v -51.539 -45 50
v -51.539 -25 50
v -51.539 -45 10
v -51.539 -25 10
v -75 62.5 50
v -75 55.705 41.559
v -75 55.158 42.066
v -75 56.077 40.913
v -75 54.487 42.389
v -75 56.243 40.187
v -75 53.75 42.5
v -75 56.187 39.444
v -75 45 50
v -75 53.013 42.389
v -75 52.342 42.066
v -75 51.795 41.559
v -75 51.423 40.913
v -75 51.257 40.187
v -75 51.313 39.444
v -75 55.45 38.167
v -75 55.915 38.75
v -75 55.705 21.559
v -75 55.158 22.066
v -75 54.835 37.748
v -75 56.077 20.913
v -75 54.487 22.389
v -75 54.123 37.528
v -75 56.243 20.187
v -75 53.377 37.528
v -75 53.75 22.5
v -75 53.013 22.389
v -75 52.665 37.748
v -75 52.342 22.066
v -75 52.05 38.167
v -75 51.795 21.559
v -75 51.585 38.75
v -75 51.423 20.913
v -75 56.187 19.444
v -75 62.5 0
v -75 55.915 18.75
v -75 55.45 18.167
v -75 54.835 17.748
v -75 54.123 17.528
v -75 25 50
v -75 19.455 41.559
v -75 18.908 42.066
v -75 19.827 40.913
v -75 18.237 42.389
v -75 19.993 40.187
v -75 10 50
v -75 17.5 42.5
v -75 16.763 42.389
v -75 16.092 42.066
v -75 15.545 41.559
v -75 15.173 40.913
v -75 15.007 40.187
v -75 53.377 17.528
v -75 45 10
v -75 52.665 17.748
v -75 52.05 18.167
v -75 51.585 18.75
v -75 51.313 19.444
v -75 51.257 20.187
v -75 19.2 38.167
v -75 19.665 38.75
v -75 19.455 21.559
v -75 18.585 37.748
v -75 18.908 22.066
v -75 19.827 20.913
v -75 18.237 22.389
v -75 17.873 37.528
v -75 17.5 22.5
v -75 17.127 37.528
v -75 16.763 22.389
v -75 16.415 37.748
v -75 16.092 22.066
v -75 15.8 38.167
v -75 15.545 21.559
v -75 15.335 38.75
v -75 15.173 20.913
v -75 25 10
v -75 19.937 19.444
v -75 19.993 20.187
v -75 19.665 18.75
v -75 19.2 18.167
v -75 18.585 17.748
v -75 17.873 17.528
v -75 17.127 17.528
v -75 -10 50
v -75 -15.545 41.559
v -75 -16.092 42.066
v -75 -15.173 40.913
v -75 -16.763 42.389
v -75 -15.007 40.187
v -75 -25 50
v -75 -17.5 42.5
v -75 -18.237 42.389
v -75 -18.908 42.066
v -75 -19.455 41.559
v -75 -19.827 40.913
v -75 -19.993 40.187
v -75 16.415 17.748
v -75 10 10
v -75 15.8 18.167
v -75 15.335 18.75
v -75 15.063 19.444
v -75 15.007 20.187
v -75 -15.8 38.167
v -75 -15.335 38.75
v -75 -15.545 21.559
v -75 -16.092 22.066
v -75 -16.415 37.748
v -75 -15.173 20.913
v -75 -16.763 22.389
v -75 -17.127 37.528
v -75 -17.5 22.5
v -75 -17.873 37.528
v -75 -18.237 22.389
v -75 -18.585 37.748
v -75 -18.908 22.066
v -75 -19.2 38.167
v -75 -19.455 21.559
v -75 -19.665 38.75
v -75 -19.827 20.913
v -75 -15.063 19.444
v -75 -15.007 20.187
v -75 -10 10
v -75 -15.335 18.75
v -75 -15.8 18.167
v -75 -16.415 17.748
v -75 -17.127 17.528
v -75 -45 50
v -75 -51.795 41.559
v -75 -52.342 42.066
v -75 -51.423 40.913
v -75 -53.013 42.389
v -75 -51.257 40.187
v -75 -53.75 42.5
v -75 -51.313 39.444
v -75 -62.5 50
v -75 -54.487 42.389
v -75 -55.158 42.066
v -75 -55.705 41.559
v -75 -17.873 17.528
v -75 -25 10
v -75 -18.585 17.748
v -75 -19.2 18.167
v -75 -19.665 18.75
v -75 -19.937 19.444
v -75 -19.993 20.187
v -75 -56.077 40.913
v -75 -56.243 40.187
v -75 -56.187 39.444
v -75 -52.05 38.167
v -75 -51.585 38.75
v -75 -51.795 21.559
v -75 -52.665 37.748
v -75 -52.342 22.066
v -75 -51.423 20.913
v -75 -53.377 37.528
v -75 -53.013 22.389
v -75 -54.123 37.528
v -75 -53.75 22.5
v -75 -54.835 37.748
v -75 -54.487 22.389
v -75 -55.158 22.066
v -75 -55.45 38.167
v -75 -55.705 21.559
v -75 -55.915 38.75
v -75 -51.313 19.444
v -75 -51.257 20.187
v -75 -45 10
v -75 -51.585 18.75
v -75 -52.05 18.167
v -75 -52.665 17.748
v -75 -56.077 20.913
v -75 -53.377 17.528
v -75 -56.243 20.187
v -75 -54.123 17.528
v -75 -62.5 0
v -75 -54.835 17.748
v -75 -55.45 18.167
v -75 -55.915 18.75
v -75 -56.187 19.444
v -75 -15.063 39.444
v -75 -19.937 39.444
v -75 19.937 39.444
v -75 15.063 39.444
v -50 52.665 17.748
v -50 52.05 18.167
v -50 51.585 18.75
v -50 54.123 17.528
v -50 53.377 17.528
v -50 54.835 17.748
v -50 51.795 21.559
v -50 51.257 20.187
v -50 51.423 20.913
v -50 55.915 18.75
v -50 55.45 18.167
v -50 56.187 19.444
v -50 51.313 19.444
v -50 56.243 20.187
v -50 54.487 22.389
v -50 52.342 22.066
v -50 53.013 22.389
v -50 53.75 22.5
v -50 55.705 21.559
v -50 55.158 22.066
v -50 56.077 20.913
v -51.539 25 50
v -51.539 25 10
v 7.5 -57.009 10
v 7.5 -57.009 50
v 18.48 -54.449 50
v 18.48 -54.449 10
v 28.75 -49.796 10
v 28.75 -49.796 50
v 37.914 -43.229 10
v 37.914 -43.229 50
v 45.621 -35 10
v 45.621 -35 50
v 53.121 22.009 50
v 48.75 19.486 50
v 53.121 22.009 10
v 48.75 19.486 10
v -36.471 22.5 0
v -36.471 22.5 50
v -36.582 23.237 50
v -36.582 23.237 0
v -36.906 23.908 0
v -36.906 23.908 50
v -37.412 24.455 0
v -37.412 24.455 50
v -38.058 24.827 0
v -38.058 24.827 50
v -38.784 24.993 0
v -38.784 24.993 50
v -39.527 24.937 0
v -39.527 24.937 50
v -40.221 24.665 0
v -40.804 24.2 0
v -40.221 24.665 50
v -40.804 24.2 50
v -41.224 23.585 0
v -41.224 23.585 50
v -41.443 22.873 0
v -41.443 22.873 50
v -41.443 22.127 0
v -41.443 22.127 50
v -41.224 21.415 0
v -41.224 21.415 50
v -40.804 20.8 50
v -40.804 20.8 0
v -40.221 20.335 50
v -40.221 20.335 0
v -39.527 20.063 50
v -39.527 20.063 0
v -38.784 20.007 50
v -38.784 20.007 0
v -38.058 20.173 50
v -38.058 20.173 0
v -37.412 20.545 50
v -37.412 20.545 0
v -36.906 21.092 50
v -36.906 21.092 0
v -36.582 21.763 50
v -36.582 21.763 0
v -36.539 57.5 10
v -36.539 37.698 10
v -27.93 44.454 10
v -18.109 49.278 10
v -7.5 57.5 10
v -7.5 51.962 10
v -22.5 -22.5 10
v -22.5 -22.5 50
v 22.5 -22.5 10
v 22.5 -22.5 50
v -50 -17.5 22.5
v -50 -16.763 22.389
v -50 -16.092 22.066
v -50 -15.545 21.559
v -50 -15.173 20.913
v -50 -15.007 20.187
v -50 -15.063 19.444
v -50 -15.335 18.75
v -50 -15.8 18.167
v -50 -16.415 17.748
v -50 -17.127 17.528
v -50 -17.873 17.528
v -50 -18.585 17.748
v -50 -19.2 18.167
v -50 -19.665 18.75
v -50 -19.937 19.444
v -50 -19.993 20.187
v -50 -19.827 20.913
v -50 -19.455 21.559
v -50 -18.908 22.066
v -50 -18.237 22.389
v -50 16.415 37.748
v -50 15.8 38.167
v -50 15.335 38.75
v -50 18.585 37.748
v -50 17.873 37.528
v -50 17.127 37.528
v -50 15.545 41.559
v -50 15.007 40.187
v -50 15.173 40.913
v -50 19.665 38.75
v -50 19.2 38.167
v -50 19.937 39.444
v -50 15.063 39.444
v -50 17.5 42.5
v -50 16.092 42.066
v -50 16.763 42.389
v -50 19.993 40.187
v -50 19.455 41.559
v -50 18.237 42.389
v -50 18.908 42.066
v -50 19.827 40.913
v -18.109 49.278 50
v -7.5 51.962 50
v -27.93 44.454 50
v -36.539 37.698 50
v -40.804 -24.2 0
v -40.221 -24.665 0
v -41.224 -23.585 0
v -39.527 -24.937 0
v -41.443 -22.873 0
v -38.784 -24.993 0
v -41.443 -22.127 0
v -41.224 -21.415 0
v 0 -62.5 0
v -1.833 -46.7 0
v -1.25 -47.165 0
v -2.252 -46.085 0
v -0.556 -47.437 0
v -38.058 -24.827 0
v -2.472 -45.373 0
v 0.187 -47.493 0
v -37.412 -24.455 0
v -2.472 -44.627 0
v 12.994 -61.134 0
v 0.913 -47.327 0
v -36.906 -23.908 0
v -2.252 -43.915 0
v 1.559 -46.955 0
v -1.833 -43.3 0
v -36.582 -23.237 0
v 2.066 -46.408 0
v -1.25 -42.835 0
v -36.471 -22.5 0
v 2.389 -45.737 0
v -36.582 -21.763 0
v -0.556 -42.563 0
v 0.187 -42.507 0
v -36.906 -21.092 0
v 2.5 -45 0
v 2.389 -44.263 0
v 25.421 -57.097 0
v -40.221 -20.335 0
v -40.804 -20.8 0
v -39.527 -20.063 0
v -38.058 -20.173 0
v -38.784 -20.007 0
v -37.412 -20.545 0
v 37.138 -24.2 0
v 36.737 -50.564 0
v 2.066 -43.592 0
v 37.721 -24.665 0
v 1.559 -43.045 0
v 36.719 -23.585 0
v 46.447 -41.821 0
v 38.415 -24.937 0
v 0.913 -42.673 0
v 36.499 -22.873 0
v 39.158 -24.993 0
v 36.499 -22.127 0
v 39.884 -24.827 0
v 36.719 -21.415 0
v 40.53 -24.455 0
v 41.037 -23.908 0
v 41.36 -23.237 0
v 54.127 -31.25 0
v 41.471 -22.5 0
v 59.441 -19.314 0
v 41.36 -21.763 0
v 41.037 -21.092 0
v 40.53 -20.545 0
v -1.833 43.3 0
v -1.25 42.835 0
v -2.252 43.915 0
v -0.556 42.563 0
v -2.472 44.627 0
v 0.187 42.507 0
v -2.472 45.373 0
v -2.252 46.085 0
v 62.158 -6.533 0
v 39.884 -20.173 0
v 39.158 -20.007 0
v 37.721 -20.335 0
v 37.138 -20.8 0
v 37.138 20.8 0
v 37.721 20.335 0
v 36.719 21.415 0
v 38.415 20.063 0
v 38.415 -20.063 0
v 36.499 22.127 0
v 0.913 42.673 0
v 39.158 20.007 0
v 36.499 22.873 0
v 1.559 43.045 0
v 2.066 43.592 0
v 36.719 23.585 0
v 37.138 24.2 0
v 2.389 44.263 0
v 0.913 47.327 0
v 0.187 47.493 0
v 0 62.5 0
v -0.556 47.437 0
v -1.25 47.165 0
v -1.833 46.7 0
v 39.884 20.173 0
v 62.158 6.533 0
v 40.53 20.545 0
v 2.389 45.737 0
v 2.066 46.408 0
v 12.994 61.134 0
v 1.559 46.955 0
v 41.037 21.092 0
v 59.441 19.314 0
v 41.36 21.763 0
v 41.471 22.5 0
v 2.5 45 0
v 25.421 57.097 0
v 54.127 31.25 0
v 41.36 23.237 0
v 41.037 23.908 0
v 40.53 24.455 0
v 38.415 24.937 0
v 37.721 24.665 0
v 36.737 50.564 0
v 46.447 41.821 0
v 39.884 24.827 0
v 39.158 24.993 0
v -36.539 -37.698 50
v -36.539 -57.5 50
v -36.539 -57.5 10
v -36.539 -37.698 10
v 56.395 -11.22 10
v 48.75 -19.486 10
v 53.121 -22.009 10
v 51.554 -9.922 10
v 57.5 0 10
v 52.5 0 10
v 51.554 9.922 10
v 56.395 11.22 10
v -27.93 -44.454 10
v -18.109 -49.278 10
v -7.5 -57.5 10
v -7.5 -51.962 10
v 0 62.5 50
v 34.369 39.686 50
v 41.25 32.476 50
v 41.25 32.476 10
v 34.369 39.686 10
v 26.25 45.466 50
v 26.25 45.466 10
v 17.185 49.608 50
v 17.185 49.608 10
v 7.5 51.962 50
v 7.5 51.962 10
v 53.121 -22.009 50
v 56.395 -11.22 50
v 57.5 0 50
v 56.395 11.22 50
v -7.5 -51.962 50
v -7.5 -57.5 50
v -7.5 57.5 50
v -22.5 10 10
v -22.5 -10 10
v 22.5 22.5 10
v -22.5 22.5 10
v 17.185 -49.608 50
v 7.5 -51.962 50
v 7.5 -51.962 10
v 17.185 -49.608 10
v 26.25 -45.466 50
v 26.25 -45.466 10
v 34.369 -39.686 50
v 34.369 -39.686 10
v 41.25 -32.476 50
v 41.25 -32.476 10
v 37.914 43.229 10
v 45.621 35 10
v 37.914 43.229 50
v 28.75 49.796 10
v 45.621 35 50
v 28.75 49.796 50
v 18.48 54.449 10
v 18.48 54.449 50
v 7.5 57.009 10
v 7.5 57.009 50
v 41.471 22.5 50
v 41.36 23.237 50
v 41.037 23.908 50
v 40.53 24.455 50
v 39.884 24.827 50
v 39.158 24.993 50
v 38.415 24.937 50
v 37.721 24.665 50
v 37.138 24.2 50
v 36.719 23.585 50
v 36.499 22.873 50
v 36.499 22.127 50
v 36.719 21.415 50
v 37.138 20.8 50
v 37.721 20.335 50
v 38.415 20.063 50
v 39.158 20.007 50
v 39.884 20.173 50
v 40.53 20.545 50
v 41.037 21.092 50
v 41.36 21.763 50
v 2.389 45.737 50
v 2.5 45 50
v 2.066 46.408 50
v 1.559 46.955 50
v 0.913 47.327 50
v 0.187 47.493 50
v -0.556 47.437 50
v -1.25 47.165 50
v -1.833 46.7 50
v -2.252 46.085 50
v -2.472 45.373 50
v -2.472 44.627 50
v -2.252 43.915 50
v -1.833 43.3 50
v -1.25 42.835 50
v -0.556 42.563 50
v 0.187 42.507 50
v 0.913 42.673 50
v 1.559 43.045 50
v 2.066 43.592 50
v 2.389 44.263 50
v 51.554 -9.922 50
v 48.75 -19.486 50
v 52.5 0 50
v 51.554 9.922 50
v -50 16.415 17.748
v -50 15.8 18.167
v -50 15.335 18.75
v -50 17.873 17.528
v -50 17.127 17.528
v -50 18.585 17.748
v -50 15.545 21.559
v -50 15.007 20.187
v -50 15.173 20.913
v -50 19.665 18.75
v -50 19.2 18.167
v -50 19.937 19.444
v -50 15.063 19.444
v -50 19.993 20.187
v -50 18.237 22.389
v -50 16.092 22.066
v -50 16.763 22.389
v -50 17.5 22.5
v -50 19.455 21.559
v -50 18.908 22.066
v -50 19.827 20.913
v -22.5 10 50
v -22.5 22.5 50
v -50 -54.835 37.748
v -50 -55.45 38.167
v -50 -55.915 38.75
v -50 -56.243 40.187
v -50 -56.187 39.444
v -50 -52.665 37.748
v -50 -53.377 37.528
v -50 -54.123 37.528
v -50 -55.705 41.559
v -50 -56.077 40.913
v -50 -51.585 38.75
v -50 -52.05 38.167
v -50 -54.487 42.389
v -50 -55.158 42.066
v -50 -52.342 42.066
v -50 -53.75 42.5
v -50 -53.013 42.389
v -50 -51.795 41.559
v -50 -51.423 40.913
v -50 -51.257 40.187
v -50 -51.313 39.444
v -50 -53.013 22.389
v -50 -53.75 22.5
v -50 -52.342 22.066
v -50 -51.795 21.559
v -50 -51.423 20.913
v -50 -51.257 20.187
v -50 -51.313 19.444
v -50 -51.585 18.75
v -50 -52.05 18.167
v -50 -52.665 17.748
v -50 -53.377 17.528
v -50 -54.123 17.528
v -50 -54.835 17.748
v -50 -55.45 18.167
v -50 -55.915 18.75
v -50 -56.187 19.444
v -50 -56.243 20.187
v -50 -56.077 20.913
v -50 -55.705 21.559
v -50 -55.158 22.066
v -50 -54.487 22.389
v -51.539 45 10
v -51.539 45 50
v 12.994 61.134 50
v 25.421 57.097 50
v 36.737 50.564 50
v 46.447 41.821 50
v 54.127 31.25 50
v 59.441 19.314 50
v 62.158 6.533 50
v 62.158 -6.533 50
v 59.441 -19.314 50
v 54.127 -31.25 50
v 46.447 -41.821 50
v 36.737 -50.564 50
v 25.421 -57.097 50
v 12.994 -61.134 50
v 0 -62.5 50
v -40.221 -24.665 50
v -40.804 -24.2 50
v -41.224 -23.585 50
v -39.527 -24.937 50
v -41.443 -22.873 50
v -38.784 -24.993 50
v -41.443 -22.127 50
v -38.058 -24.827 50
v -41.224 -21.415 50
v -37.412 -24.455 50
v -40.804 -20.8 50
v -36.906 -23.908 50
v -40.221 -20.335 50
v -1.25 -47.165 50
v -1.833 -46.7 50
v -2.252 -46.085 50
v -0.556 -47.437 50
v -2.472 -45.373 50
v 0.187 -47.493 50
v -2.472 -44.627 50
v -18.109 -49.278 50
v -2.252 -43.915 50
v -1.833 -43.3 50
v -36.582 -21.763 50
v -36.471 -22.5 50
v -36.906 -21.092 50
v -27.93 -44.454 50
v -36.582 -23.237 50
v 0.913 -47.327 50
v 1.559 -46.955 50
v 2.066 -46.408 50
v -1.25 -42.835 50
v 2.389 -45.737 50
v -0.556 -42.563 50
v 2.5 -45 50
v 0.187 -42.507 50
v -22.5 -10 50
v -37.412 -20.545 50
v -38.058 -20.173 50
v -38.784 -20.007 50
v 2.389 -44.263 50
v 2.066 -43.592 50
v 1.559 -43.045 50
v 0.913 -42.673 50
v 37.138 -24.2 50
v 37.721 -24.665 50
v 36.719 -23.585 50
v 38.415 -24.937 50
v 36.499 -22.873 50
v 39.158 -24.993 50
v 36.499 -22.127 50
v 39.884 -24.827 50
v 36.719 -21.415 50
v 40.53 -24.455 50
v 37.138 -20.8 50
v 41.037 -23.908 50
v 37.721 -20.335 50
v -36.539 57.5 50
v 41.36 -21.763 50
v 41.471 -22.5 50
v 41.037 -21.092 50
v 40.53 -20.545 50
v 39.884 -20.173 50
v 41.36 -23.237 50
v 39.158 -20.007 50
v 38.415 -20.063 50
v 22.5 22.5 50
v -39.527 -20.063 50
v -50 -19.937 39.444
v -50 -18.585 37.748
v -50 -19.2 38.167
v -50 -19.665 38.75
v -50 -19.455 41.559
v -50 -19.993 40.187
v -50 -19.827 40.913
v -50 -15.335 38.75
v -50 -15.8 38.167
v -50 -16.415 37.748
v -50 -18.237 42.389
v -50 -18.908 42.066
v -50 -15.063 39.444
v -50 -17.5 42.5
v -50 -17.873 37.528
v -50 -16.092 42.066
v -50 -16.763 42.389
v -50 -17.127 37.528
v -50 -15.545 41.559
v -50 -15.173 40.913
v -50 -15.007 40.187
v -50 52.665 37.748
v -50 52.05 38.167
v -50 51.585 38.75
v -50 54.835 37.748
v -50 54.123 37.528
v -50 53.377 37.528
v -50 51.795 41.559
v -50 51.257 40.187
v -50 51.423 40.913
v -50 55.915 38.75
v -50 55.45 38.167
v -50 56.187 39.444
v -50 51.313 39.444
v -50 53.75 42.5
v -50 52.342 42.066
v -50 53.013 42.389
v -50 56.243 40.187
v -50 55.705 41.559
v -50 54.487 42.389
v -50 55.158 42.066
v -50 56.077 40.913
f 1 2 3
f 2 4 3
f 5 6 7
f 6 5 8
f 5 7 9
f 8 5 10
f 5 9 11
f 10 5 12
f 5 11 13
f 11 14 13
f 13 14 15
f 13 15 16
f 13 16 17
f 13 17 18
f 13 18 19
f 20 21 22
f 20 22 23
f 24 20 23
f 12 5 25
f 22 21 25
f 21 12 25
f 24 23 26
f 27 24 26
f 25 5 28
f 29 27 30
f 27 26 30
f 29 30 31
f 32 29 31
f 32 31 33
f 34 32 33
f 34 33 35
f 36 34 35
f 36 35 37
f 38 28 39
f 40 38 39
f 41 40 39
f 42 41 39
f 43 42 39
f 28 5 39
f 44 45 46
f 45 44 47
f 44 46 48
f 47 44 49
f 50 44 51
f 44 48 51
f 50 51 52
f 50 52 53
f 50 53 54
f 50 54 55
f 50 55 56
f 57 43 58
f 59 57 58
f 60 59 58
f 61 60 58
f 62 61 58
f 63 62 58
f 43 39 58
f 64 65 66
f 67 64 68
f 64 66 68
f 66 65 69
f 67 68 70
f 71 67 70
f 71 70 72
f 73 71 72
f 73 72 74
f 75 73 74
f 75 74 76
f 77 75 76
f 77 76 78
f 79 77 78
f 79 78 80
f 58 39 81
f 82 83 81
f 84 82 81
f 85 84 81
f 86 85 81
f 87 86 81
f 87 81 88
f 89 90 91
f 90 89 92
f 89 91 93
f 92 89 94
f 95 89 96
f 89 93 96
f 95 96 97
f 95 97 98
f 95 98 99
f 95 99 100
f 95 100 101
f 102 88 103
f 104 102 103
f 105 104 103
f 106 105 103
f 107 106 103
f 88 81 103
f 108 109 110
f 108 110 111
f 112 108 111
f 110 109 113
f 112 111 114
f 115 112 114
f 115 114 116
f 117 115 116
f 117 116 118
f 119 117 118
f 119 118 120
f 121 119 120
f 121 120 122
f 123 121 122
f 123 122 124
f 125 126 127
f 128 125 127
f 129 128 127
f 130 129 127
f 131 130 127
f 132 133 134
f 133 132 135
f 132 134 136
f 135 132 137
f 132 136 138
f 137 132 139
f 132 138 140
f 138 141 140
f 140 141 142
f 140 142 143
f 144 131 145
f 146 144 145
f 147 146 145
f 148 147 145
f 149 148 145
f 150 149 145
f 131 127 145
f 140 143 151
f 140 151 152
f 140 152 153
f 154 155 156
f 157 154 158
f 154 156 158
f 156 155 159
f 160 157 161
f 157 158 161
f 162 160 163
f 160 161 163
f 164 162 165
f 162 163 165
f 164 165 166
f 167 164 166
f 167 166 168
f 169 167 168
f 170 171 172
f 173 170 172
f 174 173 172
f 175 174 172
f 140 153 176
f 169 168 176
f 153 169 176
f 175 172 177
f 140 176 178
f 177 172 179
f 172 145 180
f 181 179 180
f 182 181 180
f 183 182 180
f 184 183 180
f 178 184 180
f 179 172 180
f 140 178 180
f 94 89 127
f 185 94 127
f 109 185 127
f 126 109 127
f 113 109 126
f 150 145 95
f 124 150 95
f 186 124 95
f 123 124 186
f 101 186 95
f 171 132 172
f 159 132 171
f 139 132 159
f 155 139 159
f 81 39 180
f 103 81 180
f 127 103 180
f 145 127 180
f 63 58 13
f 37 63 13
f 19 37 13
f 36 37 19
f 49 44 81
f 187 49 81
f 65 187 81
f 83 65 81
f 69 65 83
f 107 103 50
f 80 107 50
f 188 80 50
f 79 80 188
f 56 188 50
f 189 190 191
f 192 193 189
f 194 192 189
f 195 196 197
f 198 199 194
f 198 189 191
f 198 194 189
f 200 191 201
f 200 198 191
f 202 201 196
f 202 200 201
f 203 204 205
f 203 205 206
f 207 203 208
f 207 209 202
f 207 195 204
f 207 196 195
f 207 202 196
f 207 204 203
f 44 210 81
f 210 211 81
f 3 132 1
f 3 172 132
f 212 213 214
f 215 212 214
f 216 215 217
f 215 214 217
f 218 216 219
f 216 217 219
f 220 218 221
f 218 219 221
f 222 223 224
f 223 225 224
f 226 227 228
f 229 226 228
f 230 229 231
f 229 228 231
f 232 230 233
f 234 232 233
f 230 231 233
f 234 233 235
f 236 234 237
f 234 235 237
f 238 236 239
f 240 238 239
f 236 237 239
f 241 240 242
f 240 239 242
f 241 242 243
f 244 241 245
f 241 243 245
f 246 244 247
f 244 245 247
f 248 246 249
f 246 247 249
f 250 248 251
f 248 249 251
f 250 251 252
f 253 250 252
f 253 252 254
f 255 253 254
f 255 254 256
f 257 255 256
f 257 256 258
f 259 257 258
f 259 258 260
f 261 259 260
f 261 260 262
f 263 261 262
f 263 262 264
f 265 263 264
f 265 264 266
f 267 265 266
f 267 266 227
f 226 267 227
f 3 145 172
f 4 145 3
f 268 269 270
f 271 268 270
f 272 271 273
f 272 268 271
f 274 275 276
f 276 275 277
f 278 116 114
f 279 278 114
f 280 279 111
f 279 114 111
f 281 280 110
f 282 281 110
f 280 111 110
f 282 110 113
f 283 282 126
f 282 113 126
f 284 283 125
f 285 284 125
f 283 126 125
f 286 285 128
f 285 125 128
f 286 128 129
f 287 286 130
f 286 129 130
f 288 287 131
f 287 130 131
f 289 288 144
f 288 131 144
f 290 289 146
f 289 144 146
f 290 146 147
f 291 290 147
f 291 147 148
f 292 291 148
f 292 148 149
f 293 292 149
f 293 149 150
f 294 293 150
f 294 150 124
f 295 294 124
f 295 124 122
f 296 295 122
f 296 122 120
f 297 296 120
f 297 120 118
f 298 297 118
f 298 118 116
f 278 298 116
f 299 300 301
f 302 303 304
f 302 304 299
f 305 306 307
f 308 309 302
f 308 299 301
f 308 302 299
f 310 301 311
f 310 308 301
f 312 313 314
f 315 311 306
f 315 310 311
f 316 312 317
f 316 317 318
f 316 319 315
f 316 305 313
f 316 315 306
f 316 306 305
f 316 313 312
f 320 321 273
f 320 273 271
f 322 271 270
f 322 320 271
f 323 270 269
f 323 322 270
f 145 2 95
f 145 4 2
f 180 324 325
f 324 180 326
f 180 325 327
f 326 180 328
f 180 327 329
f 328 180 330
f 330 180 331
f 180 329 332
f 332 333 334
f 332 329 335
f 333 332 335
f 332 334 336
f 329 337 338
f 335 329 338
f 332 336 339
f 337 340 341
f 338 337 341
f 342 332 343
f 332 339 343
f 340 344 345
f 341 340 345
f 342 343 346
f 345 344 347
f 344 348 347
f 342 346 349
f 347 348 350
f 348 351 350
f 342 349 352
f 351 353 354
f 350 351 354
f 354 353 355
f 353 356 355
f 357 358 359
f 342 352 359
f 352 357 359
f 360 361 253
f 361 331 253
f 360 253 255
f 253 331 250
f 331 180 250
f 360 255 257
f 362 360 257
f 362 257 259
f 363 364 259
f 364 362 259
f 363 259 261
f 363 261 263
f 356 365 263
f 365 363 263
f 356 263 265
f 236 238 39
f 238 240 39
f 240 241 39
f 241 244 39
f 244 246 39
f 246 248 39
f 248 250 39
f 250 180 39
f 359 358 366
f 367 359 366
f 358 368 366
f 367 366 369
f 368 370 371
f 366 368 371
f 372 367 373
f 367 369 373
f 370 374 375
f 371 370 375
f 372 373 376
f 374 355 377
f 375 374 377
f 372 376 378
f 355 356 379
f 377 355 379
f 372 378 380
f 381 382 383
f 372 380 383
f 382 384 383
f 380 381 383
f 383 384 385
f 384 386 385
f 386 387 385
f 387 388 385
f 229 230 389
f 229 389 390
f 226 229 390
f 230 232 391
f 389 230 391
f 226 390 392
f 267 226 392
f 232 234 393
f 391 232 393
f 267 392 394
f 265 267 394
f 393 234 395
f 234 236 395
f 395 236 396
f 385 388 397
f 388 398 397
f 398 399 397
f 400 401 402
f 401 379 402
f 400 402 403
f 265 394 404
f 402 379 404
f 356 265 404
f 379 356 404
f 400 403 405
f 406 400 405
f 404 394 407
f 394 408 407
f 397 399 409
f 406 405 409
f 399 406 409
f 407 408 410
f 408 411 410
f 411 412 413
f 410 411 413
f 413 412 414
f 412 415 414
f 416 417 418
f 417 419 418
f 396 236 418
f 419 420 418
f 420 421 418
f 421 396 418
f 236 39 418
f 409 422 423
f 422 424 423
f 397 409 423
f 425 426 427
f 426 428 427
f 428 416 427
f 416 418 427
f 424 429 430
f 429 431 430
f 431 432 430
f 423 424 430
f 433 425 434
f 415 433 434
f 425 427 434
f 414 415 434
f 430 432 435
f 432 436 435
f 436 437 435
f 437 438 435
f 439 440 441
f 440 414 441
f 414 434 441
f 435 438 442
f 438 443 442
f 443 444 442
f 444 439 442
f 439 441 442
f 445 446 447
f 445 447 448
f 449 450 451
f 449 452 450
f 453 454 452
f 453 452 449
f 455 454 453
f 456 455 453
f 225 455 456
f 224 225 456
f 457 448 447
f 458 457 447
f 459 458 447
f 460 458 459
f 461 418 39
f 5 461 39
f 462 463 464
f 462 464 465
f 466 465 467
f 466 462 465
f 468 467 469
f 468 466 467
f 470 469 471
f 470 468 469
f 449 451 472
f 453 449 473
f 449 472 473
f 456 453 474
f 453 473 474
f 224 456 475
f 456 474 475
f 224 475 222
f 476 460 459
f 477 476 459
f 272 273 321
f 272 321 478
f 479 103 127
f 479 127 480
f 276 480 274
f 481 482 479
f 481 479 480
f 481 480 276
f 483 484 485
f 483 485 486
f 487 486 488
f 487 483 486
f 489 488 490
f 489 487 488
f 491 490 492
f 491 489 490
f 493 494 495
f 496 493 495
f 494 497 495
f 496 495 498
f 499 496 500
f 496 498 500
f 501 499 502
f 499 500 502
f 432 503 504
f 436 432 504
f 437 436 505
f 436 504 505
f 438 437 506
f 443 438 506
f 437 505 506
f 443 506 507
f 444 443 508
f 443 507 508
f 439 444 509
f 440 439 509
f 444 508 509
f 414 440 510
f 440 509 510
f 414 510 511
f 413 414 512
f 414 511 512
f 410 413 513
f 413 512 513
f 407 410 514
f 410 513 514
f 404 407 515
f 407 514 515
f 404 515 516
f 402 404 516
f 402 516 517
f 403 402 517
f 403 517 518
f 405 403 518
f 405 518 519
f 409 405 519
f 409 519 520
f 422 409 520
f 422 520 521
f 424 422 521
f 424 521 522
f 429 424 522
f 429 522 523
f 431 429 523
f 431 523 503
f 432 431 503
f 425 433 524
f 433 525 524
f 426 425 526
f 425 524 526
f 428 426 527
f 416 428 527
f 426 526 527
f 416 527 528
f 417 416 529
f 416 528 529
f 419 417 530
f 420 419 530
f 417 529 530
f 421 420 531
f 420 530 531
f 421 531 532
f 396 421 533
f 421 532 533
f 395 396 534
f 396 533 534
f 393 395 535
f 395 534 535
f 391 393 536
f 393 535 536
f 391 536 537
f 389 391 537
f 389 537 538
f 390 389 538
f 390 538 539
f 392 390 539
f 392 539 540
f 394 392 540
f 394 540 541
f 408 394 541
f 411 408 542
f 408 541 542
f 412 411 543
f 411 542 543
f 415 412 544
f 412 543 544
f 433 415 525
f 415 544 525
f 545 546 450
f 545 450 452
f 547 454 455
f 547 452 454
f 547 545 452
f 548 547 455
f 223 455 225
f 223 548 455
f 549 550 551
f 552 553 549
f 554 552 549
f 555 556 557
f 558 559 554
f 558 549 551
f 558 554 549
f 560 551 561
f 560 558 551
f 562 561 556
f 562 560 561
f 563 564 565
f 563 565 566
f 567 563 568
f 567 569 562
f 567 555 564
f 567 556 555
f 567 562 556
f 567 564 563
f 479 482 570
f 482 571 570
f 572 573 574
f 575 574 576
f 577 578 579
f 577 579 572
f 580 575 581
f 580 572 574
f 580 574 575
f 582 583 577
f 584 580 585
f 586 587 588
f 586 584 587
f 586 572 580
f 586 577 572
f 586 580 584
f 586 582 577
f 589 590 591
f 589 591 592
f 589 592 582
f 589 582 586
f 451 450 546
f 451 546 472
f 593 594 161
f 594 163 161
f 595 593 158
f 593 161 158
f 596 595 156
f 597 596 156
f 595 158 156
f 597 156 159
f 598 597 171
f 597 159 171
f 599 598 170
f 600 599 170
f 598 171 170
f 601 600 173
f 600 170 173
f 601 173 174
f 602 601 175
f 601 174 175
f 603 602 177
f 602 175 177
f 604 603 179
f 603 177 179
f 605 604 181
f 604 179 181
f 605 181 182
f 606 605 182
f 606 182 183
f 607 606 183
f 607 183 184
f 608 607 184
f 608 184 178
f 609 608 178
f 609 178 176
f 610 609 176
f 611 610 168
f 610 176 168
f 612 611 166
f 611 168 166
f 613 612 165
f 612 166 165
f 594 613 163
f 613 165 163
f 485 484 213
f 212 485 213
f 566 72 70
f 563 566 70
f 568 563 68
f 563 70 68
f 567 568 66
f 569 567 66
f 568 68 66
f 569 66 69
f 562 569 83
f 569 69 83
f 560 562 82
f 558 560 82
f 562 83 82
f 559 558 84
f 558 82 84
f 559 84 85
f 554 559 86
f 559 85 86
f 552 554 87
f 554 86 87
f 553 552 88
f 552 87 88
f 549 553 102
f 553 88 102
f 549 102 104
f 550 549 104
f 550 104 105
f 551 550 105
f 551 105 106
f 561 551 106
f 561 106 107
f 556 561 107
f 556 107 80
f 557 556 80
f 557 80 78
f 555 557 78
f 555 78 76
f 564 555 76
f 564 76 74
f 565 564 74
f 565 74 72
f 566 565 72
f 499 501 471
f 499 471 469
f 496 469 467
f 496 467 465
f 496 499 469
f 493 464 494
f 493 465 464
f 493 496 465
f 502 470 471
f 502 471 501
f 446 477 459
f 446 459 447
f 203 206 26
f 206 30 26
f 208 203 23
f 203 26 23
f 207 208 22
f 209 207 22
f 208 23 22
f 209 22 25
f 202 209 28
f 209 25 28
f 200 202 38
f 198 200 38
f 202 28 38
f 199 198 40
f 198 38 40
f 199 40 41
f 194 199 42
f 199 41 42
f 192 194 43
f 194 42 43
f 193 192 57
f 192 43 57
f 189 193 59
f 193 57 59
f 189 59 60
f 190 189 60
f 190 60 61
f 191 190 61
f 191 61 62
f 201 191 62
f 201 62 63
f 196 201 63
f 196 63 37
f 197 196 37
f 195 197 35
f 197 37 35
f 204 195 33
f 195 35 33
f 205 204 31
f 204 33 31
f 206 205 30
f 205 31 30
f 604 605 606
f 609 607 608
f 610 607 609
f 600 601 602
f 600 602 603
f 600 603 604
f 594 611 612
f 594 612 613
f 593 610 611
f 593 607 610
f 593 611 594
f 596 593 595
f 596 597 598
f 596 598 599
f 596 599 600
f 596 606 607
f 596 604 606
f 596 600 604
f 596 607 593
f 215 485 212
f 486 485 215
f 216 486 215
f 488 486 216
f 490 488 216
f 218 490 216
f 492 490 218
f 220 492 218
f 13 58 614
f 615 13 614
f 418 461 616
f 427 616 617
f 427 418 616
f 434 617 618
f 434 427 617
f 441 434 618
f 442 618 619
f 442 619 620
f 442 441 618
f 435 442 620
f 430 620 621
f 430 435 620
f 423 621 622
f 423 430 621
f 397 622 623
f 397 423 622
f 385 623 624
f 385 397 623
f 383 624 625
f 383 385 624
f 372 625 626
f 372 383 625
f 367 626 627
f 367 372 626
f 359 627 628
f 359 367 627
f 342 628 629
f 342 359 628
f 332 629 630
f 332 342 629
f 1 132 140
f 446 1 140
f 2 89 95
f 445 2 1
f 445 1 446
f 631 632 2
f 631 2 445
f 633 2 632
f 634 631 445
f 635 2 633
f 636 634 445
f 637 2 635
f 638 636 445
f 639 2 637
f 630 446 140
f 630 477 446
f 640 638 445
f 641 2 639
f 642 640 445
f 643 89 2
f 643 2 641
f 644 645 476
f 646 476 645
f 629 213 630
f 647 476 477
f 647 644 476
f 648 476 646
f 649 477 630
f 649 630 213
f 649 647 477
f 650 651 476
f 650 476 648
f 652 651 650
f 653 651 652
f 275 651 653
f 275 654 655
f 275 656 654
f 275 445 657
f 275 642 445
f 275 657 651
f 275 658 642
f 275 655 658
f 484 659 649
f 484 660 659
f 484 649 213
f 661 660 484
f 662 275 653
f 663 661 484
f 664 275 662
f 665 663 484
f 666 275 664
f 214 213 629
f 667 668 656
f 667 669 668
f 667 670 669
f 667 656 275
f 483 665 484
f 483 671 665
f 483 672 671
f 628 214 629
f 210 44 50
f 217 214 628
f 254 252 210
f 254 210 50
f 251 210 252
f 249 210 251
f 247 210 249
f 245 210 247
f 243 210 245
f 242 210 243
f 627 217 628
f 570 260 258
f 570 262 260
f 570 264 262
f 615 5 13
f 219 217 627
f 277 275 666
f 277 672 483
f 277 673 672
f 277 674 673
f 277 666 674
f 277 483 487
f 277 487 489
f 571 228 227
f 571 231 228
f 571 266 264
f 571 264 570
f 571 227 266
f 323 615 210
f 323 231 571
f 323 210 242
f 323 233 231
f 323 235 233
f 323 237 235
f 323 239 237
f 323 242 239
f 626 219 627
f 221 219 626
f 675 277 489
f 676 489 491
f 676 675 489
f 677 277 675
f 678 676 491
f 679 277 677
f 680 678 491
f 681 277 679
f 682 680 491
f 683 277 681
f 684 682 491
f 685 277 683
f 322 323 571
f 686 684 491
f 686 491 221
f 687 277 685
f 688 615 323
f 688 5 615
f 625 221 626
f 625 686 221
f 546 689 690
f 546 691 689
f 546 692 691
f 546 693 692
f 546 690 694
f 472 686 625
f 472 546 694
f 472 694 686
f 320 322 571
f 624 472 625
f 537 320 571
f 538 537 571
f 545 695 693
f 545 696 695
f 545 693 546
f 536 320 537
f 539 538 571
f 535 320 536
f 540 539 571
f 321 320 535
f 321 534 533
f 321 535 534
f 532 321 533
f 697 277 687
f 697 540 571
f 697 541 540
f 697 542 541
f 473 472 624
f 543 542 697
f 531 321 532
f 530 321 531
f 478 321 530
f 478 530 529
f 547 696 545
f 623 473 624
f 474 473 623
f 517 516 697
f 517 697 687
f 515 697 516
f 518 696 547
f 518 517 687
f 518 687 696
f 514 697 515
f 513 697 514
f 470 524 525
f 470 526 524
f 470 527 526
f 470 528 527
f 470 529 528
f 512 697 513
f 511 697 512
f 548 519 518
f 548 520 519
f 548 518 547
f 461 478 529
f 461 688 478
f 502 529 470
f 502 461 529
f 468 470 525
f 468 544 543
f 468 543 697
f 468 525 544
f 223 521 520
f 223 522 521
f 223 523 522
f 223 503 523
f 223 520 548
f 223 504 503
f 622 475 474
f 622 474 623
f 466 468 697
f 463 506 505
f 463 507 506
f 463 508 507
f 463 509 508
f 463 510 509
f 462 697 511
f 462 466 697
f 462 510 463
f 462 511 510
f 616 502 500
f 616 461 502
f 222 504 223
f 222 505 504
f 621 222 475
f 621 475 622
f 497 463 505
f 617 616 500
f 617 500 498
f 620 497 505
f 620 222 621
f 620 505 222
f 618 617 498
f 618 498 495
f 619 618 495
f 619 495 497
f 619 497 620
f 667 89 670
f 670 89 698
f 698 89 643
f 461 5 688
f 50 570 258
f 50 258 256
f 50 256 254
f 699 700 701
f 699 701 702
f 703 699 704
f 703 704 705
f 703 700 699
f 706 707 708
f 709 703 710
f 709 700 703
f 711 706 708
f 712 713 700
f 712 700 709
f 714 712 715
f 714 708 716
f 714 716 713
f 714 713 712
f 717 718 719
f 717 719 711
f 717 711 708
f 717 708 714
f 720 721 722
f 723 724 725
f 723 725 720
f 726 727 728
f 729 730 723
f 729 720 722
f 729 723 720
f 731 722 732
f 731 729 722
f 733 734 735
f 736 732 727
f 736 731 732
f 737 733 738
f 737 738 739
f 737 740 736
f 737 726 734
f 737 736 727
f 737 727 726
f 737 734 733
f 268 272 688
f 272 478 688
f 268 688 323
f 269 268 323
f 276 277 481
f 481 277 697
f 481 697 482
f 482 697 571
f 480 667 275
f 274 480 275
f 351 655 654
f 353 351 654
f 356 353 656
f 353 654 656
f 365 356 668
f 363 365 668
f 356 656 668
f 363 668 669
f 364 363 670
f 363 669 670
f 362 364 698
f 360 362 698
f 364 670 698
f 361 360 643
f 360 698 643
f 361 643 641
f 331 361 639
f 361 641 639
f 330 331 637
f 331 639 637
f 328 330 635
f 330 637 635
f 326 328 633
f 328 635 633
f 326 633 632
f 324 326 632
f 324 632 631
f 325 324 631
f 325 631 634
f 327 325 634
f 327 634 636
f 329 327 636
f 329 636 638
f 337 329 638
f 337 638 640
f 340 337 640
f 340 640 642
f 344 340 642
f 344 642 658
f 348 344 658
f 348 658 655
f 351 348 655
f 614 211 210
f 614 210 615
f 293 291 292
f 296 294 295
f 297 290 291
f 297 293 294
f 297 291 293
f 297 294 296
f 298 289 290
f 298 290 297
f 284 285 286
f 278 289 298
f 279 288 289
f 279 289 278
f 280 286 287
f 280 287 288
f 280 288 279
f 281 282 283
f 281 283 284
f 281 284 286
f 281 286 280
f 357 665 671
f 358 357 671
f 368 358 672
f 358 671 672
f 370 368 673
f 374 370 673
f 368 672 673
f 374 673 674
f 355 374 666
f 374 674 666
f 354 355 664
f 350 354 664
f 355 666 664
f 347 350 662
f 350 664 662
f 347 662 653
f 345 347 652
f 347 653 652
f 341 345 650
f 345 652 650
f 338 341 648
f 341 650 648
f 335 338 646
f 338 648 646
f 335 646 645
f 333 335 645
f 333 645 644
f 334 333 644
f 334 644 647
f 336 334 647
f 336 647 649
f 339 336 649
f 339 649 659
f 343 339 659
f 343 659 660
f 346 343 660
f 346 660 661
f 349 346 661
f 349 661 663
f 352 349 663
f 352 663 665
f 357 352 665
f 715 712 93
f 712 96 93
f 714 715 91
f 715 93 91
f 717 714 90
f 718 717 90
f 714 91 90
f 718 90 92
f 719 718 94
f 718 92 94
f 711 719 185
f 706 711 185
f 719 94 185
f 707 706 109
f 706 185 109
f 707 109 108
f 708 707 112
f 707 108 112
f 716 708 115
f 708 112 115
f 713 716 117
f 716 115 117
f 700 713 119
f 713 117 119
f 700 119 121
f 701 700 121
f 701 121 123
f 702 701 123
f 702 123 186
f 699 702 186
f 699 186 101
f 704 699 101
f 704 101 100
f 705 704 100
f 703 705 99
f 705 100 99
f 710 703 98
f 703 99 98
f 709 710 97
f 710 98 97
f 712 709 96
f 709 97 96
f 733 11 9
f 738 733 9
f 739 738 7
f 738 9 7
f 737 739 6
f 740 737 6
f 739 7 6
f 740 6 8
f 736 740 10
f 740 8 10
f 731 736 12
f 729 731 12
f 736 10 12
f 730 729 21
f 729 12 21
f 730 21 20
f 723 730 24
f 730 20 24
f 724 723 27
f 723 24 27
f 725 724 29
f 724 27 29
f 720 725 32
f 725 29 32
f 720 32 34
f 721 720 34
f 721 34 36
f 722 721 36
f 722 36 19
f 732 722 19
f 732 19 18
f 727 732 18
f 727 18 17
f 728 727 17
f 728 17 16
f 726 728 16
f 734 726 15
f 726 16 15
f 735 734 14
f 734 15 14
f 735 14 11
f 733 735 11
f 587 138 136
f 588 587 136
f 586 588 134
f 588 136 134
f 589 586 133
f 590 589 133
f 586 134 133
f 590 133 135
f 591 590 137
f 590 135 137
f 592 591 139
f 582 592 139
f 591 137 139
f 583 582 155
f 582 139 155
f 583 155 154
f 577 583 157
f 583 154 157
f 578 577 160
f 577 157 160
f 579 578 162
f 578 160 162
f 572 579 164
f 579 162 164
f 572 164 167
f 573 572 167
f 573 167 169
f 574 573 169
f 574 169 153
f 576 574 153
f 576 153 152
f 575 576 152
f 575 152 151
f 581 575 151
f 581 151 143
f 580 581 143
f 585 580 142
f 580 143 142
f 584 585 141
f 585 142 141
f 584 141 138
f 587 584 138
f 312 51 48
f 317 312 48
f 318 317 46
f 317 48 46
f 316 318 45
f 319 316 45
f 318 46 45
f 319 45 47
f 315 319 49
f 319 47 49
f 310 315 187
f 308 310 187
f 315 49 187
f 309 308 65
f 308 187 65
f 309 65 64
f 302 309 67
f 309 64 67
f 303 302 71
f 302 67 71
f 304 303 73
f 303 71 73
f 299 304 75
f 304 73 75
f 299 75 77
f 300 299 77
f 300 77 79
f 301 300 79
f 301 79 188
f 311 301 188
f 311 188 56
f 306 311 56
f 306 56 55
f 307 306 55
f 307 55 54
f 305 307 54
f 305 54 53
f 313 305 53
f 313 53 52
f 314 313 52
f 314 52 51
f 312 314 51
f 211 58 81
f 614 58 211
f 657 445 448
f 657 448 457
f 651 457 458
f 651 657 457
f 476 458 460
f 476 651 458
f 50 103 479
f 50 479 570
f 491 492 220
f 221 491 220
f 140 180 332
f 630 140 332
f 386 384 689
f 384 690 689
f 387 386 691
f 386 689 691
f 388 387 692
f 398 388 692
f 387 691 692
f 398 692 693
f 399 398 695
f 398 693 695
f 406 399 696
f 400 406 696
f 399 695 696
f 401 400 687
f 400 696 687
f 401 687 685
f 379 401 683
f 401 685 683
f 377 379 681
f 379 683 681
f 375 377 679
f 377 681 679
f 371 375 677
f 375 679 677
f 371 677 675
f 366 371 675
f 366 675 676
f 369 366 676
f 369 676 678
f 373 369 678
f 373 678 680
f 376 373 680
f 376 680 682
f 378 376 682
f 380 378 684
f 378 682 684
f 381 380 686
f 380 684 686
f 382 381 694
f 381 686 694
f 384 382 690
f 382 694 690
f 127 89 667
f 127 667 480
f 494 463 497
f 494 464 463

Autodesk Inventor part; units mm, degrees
ref_plane "YZ Plane" through (0, 0, 0) normal (1, 0, 0) x (0, 1, 0)
ref_plane "XZ Plane" through (0, 0, 0) normal (0, 1, 0) x (-1, 0, 0)
ref_plane "XY Plane" through (0, 0, 0) normal (0, 0, 1) x (1, 0, 0)
sketch "Sketch1" plane through (0, 0, 0) normal (0, 0, 1) x (1, 0, 0)
  circle A0 centre (0, 0) radius 62.5 construction
  line L0 (0, 62.5) -> (-75, 62.5)
  line L1 (-75, 62.5) -> (-75, -62.5)
  line L2 (-75, -62.5) -> (0, -62.5)
  arc A1 (0, -62.5) -> (0, 62.5) centre (0, 0) ccw
  dimension "d0" = 125
  dimension "d1" = 75
  dimension "d2" = 75
extrude "Extrusion1" add sketch "Sketch1" along normal blind 50
sketch "Sketch6" plane through (0, 0, 50) normal (0, 0, 1) x (1, 0, 0)
  line L0 (-22.5, -22.5) -> (22.5, -22.5)
  line L1 (22.5, -22.5) -> (22.5, 22.5)
  line L2 (22.5, 22.5) -> (-22.5, 22.5)
  line L3 (-22.5, 22.5) -> (-22.5, -22.5)
  line L4 (-22.5, -22.5) -> (22.5, 22.5) construction
  line L5 (22.5, -22.5) -> (-22.5, 22.5) construction
  point P0 (0, 0)
  dimension "d23" = 45
  dimension "d24" = 45
extrude "Extrusion6" cut sketch "Sketch6" against normal blind 40
sketch "Sketch7" plane through (-22.5, -22.5, 50) normal (1, 0, 0) x (0, 0, -1)
  line L0 (40, 32.5) -> (0, 32.5)
  line L1 (0, 32.5) -> (0, 12.5)
  line L2 (0, 12.5) -> (40, 12.5)
  line L3 (40, 12.5) -> (40, 32.5)
  point P0 (50, 22.5)
  point P1 (40, 22.5)
  dimension "d27" = 40
  dimension "d28" = 20
  dimension "d29" = 10
extrude "Extrusion7" cut sketch "Sketch7" against normal through all
sketch "Sketch9" plane through (0, 0, 50) normal (0, 0, 1) x (1, 0, 0)
  circle A0 centre (0, 45) radius 2.5
  circle A1 centre (-38.9711, 22.5) radius 2.5
  circle A2 centre (-38.9711, -22.5) radius 2.5
  circle A3 centre (0, -45) radius 2.5
  circle A4 centre (38.9711, -22.5) radius 2.5
  circle A5 centre (38.9711, 22.5) radius 2.5
  point P0 (0, 0)
  dimension "d35" = 5
  dimension "d36" = 45
  dimension "d39" = 360
extrude "Extrusion9" cut sketch "Sketch9" against normal through all
sketch "Sketch10" plane through (0, 0, 50) normal (0, 0, 1) x (1, 0, 0)
  circle A0 centre (0, 0) radius 52.5
  arc A1 (0, -57.5) -> (0, -57.5) centre (0, 0) ccw
  line L0 (0, -57.5) -> (-75, -57.5)
  line L1 (-75, 57.5) -> (-75, -57.5)
  line L2 (0, -57.5) -> (-75, -57.5)
  line L3 (0, 57.5) -> (-75, 57.5)
  circle A2 centre (0, 0) radius 57.5 construction
  arc A3 (0, -57.5) -> (0, 57.5) centre (0, 0) ccw
  line L4 (-75, -10) -> (-75, 10)
  point P0 (-75, 0)
  dimension "d111" = 115
  dimension "d43" = 105
  dimension "d114" = 90
extrude "Extrusion10" cut sketch "Sketch10" against normal blind 40
sketch "Sketch12" plane through (0, 0, 10) normal (0, 0, 1) x (1, 0, 0)
  line L0 (0, 0) -> (77.9423, -45) construction
  line L1 (0, 0) -> (90, 0) construction
  line L2 (48.75, -19.4856) -> (57.4855, -24.529)
  line L3 (41.25, -32.476) -> (49.9855, -37.5194)
  arc A0 (41.25, -32.476) -> (48.75, -19.4856) centre (0, 0) ccw
  arc A1 (49.9877, -37.5164) -> (57.484, -24.5324) centre (-4.3593, 2.5168) ccw
  line L4 (41.25, 32.476) -> (49.9855, 37.5194)
  arc A2 (48.75, 19.4856) -> (41.25, 32.476) centre (0, 0) ccw
  line L5 (48.75, 19.4856) -> (57.4855, 24.529)
  arc A3 (57.4855, 24.529) -> (49.9855, 37.5194) centre (-4.3593, -2.5168) ccw
  line L6 (0, 0) -> (0, -109.4234) construction
  line L7 (7.5, -51.9615) -> (7.5, -62.0484)
  line L8 (-7.5, -51.9615) -> (-7.5, -62.5)
  line L9 (0, -62.5) -> (-7.5, -62.5)
  arc A4 (-7.5, -51.9615) -> (7.5, -51.9615) centre (0, 0) ccw
  line L10 (-7.5, 51.9615) -> (-7.5, 62.5)
  line L11 (0, 62.5) -> (-7.5, 62.5)
  arc A5 (7.5, 51.9615) -> (-7.5, 51.9615) centre (0, 0) ccw
  arc A6 (-51.5388, -10) -> (-51.5388, 10) centre (0, 0) ccw projected
  arc A7 (0, -62.5) -> (0, 62.5) centre (0, 0) ccw projected
  line L12 (-75, -62.5) -> (0, -62.5) construction
  arc A8 (0, -62.5) -> (7.5, -62.0484) centre (0, 0) ccw
  line L13 (7.5, 51.9615) -> (7.5, 62.0484)
  arc A9 (7.5, 62.0484) -> (0, 62.5) centre (0, 0) ccw
  point P0 (54.0974, -31.2332)
  dimension "d50" = 30
  dimension "d52" = 15
  dimension "d53" = 52.5
  dimension "d54" = 67.5
  dimension "d57" = 60
  dimension "d61" = 15
extrude "Extrusion11" add sketch "Sketch12" along normal blind 40 contours L2 A7 A1 L3 A0 | A2 L4 A3 L5 | A7 A1 | A3 A7 | L7 A7 L9 L8 A4 | A5 L10 L11 A7 L13
sketch "Sketch16" plane through (0, 0, 10) normal (0, 0, 1) x (1, 0, 0)
  line L0 (-22.5, 10) -> (-51.5388, 10) projected
  line L1 (-51.5388, 10) -> (-51.5388, 62.5)
  line L2 (-36.5388, 62.5) -> (-36.5388, 37.6983)
  arc A0 (-36.5388, 37.6983) -> (-51.5388, 10) centre (0, 0) ccw
  arc A1 (-7.5, 51.9615) -> (-51.5388, 10) centre (0, 0) ccw projected
  line L3 (-36.5388, 62.5) -> (-51.5388, 62.5)
  line L4 (0, 0) -> (-111.9606, 0) construction
  line L5 (-51.5388, -10) -> (-51.5388, -62.5)
  line L6 (-36.5388, -62.5) -> (-36.5388, -37.6983)
  arc A2 (-51.5388, -10) -> (-36.5388, -37.6983) centre (0, 0) ccw
  line L7 (-36.5388, -62.5) -> (-51.5388, -62.5)
  point P0 (-44.0388, -62.5)
  dimension "d69" = 15
extrude "Extrusion14" add sketch "Sketch16" along normal blind 40
sketch "Sketch17" plane through (0, 0, 10) normal (0, 0, 1) x (1, 0, 0)
  line L0 (-51.5388, 57.5) -> (-51.5388, 10) projected
  line L1 (-51.5388, 10) -> (-75, 10)
  line L2 (-75, -57.5) -> (-75, 57.5) projected
  line L3 (-51.5388, 25) -> (-75, 25)
  line L4 (-51.5388, -10) -> (-51.5388, -57.5) projected
  line L5 (-51.5388, -10) -> (-75, -10)
  line L6 (-51.5388, -25) -> (-75, -25)
  line L7 (-51.5388, 25) -> (-51.5388, 10)
  line L8 (-75, 25) -> (-75, 10)
  line L9 (-75, -10) -> (-75, -25)
  line L10 (-51.5388, -10) -> (-51.5388, -25)
  point P0 (0, 0)
  point P1 (-51.5388, 67.5)
  point P2 (-75, -67.5)
  point P3 (-75, 67.5)
  point P4 (-51.5388, -67.5)
  point P5 (-75, -62.5)
  point P6 (-75, 62.5)
  point P7 (-51.5388, 62.5)
  point P8 (-51.5388, -62.5)
  dimension "d72" = 15
  dimension "d73" = 15
extrude "Extrusion15" add sketch "Sketch17" along normal blind 40
sketch "Sketch19" plane through (0, 0, 10) normal (0, 0, 1) x (1, 0, 0)
  line L0 (-75, 62.5) -> (-51.5388, 62.5)
  line L1 (-75, 25) -> (-75, -25) projected
  line L2 (-51.5388, 62.5) -> (-75, 62.5)
  line L3 (-75, 62.5) -> (-75, 45)
  line L4 (-75, 45) -> (-51.5388, 45)
  line L5 (-51.5388, 45) -> (-51.5388, 62.5)
  line L6 (-51.5388, -62.5) -> (-75, -62.5)
  line L7 (-75, 62.5) -> (-75, -62.5) projected
  line L8 (-51.5388, -62.5) -> (-75, -62.5)
  line L9 (-75, -62.5) -> (-75, -45)
  line L10 (-75, -45) -> (-51.5388, -45)
  line L11 (-51.5388, -45) -> (-51.5388, -62.5)
  point P0 (0, 0)
  dimension "d84" = 17.5
  dimension "d85" = 17.5
extrude "Extrusion16" add sketch "Sketch19" along normal blind 40
sketch "Sketch18" plane through (-75, -62.5, 0) normal (-1, 0, 0) x (0, 0, 1)
  circle A0 centre (40, 45) radius 2.5
  circle A1 centre (20, 45) radius 2.5
  line L0 (50, 52.5) -> (50, 37.5) projected
  line L1 (0, 125) -> (0, 0) projected
  circle A2 centre (40, 80) radius 2.5
  circle A3 centre (20, 80) radius 2.5
  circle A4 centre (20, 116.25) radius 2.5
  circle A5 centre (20, 8.75) radius 2.5
  circle A6 centre (40, 8.75) radius 2.5
  circle A7 centre (40, 116.25) radius 2.5
  line L2 (0, 125) -> (50, 125) projected
  line L3 (10, 87.5) -> (50, 87.5) projected
  line L4 (10, 52.5) -> (50, 52.5) projected
  line L5 (0, 0) -> (50, 0) projected
  point P0 (0, 62.5)
  dimension "d76" = 5
  dimension "d77" = 5
  dimension "d78" = 10
  dimension "d80" = 20
  dimension "d91" = 5
  dimension "d92" = 5
  dimension "d94" = 5
  dimension "d95" = 5
  dimension "d96" = 5
  dimension "d97" = 5
  dimension "d115" = 8.75
  dimension "d116" = 7.5
  dimension "d117" = 7.5
  dimension "d118" = 8.75
extrude "Extrusion18" cut sketch "Sketch18" against normal blind 25
properties part number "SJ001" material "ABS Plastic"
